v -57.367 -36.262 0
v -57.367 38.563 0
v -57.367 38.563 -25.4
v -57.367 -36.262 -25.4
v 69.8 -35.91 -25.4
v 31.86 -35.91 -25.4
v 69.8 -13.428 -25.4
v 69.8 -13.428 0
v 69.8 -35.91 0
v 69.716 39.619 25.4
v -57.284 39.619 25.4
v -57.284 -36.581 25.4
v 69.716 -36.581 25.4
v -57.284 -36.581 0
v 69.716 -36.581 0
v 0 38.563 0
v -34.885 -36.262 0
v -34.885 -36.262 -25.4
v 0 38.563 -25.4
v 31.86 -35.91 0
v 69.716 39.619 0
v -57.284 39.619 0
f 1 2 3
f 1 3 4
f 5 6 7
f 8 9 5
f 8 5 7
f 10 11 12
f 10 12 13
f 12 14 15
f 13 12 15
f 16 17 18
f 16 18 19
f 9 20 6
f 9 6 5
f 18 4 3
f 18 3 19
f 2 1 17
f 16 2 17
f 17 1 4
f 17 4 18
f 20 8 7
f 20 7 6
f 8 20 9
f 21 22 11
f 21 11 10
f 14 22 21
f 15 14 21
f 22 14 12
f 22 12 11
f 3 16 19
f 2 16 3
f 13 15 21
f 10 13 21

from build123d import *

# Parameters (mm, degrees)
F0_W     = 127
F0_H     = 76.2
F1_DEPTH = 25.4
F3_DEPTH = 25.4


with BuildPart() as f1:
    # F0 (on Top) → F1 (new body)
    with BuildSketch(Plane.XY):
        with Locations((6.21623, 1.518884)):
            Rectangle(F0_W, F0_H)
    extrude(amount=F1_DEPTH)


with BuildPart() as f3:
    # F2 (on Top) → F3 (new body)
    with BuildSketch(Plane.XY):
        Polygon((-57.367429, 38.563348), (-57.367429, -36.261585), (-34.884822, -36.261585), (0, 38.563348), align=None)
        Polygon((31.860426, -35.910297), (69.799833, -35.910297), (69.799833, -13.427687), align=None)
    extrude(amount=-F3_DEPTH)


solid = Compound([f1.part, f3.part])
